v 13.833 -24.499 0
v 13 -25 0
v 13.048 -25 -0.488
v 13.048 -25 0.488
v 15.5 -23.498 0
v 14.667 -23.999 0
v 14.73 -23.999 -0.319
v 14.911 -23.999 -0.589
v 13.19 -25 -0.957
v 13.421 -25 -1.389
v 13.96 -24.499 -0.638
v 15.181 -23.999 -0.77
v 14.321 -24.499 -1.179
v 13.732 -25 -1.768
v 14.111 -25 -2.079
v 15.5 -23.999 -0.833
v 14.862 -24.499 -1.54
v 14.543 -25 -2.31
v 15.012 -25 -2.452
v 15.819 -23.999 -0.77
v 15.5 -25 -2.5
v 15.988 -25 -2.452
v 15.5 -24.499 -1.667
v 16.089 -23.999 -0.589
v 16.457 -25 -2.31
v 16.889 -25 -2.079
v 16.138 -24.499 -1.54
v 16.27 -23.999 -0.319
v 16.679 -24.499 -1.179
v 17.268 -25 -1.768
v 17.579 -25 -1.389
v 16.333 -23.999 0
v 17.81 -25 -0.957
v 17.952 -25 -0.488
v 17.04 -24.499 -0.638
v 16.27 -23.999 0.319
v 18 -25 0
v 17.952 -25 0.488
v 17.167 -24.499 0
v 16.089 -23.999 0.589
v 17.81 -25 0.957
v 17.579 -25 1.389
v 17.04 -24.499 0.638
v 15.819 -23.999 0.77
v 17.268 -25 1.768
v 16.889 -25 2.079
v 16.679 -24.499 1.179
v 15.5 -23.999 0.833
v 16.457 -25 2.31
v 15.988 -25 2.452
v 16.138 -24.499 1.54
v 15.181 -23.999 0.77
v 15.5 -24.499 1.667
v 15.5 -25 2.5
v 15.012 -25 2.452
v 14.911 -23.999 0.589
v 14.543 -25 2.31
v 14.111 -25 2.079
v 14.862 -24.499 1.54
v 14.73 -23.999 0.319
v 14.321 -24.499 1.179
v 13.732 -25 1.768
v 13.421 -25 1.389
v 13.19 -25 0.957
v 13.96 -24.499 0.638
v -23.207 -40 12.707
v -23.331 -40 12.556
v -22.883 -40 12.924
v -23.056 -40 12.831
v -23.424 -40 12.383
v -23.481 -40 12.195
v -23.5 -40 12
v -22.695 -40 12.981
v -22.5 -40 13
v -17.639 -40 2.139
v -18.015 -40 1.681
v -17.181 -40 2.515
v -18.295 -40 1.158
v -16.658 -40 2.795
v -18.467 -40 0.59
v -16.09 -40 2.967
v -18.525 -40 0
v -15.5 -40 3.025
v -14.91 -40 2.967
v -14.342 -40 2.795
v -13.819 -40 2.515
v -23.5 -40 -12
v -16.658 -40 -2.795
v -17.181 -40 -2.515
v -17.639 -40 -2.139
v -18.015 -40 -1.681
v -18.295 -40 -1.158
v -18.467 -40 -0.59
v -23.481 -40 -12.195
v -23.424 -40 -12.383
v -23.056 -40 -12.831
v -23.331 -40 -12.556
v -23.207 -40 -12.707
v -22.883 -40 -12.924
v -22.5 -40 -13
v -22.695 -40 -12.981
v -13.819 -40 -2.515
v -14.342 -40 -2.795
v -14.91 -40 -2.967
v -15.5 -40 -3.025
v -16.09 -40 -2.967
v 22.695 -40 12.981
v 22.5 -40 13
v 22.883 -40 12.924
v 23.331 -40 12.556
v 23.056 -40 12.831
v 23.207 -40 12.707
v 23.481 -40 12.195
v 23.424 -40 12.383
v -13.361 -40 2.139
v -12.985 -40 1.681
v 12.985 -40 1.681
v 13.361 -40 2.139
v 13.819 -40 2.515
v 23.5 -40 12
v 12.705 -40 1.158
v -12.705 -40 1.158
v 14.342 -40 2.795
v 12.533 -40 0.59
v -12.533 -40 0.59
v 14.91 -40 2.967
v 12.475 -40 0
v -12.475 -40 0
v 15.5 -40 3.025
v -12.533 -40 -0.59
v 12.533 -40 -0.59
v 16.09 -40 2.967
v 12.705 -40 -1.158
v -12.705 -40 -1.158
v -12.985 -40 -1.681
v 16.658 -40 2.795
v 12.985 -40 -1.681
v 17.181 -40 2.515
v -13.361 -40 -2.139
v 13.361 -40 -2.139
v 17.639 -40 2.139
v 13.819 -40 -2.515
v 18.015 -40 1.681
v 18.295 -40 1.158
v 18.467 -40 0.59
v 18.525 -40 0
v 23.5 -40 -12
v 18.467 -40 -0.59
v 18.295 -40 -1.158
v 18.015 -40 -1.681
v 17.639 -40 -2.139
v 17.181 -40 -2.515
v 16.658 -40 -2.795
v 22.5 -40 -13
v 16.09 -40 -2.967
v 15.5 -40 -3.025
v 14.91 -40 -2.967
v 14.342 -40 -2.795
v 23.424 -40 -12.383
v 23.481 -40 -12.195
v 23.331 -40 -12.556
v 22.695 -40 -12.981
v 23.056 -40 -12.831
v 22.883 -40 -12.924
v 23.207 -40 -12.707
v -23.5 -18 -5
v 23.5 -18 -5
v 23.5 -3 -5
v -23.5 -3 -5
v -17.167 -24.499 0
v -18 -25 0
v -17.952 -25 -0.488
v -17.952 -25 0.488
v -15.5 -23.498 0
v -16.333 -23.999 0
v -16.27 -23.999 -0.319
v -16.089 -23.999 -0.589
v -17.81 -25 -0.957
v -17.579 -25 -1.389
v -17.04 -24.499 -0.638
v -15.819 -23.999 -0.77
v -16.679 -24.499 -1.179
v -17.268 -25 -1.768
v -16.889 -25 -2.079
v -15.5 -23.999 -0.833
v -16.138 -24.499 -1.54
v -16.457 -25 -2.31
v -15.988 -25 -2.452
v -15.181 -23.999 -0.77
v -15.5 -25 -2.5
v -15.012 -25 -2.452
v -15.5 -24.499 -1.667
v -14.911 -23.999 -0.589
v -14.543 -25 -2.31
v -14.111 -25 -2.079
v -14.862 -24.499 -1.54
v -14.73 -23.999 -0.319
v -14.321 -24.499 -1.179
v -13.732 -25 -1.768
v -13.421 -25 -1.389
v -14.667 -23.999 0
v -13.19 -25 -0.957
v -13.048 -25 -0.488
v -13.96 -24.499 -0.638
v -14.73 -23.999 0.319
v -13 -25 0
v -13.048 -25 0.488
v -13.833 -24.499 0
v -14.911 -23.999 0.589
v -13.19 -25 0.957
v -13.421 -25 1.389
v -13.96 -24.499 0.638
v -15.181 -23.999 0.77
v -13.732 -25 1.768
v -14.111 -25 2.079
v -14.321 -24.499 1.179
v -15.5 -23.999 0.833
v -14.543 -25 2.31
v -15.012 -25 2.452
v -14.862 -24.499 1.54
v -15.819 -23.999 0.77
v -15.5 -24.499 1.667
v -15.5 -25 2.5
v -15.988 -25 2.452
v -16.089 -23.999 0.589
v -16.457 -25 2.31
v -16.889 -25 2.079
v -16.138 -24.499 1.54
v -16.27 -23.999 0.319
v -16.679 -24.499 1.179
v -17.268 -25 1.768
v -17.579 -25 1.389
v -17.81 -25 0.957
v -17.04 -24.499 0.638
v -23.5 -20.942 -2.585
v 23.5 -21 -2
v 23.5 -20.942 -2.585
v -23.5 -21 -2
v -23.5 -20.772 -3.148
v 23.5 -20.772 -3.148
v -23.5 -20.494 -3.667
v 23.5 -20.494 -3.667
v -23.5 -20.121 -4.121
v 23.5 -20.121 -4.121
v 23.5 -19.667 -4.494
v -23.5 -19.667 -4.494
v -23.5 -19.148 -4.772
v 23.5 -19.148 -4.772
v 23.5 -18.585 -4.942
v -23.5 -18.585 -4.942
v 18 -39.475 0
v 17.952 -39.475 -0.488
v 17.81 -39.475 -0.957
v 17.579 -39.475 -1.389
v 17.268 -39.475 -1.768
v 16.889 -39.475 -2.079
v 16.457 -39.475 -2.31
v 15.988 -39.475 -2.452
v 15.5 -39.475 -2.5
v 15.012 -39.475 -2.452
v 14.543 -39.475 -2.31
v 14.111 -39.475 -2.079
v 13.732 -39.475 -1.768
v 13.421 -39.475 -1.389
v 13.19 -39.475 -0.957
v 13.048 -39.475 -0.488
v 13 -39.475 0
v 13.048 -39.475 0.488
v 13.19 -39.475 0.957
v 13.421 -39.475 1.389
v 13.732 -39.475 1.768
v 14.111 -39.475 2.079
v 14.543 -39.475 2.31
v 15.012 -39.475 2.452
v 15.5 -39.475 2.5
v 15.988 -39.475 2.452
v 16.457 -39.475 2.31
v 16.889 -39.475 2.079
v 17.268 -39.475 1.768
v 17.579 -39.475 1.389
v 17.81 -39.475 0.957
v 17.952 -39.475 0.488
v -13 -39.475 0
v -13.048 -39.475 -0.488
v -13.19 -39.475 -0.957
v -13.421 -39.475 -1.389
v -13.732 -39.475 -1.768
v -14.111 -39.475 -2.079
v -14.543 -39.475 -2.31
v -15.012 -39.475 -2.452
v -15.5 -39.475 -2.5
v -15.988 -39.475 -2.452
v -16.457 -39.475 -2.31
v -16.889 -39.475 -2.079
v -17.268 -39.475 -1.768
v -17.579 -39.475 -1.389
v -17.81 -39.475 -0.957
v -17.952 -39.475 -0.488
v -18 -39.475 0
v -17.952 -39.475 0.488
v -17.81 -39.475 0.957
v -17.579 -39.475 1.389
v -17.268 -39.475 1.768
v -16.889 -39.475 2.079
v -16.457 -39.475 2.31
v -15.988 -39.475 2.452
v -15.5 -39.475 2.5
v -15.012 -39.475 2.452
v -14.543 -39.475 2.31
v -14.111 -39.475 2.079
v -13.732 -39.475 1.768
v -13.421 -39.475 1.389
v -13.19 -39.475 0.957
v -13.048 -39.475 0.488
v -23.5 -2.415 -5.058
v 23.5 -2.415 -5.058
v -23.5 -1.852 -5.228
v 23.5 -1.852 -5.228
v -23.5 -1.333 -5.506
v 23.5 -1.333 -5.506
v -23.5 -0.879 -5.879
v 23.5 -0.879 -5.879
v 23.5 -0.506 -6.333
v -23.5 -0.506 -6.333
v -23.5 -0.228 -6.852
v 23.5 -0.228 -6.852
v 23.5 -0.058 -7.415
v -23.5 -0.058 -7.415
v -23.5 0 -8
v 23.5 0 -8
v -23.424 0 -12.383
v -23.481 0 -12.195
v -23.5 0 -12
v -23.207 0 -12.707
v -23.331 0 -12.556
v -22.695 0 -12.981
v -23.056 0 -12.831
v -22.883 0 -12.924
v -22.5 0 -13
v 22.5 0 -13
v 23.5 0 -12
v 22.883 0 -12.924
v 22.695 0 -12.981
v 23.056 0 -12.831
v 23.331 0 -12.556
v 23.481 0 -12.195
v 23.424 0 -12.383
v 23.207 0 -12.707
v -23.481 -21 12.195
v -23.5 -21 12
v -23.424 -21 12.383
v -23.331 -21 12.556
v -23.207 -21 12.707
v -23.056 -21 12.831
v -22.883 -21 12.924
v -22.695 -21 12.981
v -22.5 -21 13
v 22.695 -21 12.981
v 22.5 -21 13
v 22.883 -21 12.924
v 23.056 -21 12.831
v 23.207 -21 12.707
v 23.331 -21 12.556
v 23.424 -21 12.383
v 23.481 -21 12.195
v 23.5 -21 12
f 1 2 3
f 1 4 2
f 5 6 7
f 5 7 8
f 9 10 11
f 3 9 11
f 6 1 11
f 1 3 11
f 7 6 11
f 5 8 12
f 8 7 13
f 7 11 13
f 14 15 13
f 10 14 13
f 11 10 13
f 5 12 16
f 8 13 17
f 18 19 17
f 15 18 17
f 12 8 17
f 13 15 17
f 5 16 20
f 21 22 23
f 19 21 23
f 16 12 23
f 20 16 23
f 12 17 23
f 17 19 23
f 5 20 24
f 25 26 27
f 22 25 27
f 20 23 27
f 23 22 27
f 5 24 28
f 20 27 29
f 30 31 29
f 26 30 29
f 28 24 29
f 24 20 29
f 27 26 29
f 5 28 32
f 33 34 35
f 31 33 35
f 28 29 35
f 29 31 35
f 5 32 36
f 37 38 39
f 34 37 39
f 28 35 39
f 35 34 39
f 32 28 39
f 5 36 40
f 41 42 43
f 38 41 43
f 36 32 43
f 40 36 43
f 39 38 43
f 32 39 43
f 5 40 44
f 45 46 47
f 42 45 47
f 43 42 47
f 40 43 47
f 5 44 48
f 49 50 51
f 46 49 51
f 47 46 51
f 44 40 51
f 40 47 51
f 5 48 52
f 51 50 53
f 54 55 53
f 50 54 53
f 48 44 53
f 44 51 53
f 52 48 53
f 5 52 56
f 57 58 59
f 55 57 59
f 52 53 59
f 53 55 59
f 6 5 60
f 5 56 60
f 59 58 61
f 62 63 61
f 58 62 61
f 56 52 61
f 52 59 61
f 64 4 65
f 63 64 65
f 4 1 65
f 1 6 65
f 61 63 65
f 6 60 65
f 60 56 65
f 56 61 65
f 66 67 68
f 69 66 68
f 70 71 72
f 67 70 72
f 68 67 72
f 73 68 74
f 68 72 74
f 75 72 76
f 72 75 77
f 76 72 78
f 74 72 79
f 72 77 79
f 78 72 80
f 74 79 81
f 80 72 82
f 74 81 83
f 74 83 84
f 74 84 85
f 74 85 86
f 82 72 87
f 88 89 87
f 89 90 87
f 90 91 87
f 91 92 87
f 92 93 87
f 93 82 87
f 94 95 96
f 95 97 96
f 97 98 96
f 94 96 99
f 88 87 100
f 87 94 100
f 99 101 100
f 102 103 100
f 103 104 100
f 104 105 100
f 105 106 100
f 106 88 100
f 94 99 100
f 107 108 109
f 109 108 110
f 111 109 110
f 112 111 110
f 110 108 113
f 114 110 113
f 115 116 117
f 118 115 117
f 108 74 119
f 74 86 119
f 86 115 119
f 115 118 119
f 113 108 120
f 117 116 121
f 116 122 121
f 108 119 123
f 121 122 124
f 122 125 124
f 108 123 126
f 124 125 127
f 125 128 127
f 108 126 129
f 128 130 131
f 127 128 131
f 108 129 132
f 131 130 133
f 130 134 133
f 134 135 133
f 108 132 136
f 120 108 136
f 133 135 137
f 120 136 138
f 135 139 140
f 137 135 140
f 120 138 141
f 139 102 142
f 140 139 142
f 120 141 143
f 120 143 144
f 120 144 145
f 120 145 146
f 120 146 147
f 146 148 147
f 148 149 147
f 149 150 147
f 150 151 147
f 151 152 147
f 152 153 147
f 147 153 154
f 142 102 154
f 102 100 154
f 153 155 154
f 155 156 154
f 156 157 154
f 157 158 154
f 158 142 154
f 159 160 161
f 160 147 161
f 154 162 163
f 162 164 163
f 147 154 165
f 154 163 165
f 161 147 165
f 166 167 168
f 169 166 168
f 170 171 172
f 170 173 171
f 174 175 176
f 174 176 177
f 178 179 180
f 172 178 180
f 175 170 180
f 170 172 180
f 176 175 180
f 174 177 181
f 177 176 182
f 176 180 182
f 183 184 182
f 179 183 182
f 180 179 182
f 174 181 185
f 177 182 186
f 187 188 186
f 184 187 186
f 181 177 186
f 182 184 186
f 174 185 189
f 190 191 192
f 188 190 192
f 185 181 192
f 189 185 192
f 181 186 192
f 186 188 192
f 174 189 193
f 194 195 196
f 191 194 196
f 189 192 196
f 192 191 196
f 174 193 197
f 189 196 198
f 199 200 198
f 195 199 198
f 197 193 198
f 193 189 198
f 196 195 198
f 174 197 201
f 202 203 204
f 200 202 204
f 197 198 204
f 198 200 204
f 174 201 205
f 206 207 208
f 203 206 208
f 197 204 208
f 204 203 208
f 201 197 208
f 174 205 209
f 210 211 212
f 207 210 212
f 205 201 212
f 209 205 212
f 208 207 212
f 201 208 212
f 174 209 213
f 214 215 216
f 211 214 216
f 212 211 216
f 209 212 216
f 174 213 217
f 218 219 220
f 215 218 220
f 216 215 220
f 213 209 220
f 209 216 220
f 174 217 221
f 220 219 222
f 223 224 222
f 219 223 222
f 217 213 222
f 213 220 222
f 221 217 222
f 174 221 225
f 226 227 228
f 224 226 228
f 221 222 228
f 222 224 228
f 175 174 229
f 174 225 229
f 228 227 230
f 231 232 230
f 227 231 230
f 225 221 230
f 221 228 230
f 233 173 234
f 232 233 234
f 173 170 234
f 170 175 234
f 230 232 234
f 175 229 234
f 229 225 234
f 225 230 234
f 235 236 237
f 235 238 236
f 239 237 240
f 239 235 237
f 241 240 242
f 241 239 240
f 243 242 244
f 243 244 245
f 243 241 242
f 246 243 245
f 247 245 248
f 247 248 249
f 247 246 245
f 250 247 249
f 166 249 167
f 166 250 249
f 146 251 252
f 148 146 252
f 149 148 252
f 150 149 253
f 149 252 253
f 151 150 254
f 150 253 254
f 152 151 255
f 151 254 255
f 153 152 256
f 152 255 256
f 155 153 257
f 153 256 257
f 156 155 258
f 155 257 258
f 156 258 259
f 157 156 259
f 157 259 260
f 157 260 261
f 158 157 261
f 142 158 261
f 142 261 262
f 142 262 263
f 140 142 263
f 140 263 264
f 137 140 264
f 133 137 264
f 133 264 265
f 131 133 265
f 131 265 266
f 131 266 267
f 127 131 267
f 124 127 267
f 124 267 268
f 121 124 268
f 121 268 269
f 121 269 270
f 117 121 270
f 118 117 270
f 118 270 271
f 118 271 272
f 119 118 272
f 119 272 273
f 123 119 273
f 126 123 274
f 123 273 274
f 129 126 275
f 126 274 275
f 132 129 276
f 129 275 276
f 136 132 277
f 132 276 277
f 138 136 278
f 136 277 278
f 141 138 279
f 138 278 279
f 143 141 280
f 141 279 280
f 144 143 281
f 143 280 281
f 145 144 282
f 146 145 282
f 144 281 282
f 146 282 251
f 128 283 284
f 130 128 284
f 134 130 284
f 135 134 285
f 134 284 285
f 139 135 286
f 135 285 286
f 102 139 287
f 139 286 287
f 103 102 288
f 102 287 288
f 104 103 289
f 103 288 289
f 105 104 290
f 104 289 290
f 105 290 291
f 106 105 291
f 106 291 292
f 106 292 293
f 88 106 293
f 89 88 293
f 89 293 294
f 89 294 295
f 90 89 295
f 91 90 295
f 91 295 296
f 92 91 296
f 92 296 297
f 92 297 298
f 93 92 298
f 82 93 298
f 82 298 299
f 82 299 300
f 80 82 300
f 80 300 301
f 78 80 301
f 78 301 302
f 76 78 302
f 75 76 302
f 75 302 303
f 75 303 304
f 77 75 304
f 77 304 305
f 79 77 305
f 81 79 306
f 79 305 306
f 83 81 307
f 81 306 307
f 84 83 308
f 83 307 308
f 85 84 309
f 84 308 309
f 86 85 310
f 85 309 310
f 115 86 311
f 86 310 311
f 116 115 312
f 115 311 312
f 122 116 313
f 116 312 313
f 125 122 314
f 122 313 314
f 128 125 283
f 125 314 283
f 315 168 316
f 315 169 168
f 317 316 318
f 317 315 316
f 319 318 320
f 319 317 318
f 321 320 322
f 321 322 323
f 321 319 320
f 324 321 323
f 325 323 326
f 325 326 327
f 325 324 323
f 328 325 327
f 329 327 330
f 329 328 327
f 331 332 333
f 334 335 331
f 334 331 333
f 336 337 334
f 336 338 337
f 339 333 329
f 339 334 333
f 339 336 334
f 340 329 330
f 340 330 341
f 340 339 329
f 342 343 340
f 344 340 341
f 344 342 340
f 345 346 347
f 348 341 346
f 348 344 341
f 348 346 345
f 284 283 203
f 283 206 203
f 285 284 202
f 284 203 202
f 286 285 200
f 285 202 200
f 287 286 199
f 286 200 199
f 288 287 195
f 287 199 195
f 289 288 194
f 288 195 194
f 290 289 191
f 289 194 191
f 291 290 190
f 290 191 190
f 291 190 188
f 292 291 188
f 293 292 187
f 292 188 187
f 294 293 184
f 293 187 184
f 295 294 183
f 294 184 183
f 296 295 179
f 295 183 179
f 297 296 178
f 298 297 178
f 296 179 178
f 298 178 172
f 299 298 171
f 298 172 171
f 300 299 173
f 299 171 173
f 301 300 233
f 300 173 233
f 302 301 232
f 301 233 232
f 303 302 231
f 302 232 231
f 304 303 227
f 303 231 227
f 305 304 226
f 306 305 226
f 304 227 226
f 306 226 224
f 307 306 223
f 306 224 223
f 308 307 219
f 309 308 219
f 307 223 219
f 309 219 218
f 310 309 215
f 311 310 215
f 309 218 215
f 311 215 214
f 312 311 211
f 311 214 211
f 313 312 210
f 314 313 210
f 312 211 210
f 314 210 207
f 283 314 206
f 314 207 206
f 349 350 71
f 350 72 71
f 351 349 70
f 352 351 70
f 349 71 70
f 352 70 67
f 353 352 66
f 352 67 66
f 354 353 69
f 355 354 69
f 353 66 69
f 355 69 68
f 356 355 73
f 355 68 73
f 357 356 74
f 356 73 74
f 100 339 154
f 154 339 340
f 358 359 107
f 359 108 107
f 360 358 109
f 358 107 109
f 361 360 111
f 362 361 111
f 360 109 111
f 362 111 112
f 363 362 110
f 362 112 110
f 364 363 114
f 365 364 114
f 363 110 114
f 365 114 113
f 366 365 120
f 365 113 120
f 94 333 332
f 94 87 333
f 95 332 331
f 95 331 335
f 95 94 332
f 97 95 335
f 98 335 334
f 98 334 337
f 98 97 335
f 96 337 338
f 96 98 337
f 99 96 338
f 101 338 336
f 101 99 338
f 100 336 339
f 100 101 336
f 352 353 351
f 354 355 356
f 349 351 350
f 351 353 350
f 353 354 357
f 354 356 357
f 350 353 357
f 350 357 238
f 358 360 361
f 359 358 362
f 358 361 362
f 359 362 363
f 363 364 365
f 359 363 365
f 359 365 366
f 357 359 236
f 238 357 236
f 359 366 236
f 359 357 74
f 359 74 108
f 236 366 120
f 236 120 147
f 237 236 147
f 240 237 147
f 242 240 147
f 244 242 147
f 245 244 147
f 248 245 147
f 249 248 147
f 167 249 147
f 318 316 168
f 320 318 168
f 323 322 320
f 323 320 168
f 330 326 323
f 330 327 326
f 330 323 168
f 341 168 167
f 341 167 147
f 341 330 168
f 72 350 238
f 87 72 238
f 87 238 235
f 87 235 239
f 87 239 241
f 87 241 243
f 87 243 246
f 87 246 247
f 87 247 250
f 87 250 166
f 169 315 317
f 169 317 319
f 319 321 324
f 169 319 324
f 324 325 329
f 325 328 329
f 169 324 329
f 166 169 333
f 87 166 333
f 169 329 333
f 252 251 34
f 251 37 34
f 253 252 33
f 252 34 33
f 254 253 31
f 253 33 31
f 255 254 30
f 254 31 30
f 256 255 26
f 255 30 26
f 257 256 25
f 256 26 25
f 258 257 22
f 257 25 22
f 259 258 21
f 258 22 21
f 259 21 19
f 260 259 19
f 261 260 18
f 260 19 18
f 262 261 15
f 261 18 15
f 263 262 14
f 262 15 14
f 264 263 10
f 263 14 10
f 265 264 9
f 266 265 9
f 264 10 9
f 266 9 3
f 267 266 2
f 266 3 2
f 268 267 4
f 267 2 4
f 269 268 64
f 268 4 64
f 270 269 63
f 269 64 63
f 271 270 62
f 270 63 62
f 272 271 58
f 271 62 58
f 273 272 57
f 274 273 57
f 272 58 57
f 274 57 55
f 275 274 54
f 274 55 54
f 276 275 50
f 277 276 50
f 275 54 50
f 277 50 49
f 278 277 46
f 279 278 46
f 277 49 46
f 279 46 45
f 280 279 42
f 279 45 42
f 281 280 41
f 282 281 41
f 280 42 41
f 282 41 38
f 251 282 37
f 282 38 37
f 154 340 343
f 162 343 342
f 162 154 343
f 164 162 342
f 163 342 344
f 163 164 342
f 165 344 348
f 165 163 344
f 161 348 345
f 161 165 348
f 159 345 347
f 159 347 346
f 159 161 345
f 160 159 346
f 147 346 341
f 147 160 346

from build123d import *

# Parameters (mm, degrees)
SKETCH1_W                   = 47
SKETCH1_H                   = 26
BOSS_EXTRUDE1_DEPTH         = 40
CUT_EXTRUDE1_REACH          = 65.071
SKETCH2_W                   = 18
SKETCH2_H                   = 21
FILLET1_R                   = 3
M6_TAPPED_HOLE1_D           = 5
M6_TAPPED_HOLE1_DEPTH       = 15
M6_TAPPED_HOLE1_CSINK_D     = 6.05
M6_TAPPED_HOLE1_CSINK_ANGLE = 90
M6_TAPPED_HOLE1_TIP         = 1.502151548
FILLET2_R                   = 1


with BuildPart() as part:
    # Sketch1 → Boss-Extrude1 (new body)
    with BuildSketch(Plane(origin=(0, 0, 0), x_dir=(1, 0, 0), z_dir=(0, 1, 0))):
        Rectangle(SKETCH1_W, SKETCH1_H)
    extrude(amount=-BOSS_EXTRUDE1_DEPTH)

    # Sketch2 → Cut-Extrude1 (cut, up to next)
    with BuildSketch(Plane(origin=(23.5, 0, 0), x_dir=(0, 0, -1), z_dir=(1, 0, 0)), mode=Mode.PRIVATE) as cut_extrude1_sk1:
        with Locations((-4, -10.5)):
            Rectangle(SKETCH2_W, SKETCH2_H)
    cut_extrude1_tool1 = extrude(cut_extrude1_sk1.sketch, amount=-CUT_EXTRUDE1_REACH, mode=Mode.PRIVATE) & part.part
    add(cut_extrude1_tool1.solids().sort_by_distance((23.5, -10.5, 4))[0], mode=Mode.SUBTRACT)

    # Fillet1
    fillet1_edges = [part.edges().sort_by_distance(p)[0] for p in [
        (0, 0, -5),
        (0, -21, -5),
    ]]
    fillet(fillet1_edges, radius=FILLET1_R)

    # M6 Tapped Hole1
    with Locations(Plane(origin=(0, -40, 0), x_dir=(-1, 0, 0), z_dir=(0, -1, 0))):
        with Locations((-15.5, 0), (15.5, 0)):
            CounterSinkHole(M6_TAPPED_HOLE1_D / 2, M6_TAPPED_HOLE1_CSINK_D / 2, depth=M6_TAPPED_HOLE1_DEPTH, counter_sink_angle=M6_TAPPED_HOLE1_CSINK_ANGLE)
            with Locations((0, 0, -(M6_TAPPED_HOLE1_DEPTH + M6_TAPPED_HOLE1_TIP / 2))):  # 118° drill point
                Cone(0, M6_TAPPED_HOLE1_D / 2, M6_TAPPED_HOLE1_TIP, mode=Mode.SUBTRACT)

    # Fillet2
    fillet2_edges = [part.edges().sort_by_distance(p)[0] for p in [
        (23.5, -30.5, 13),
        (-23.5, -30.5, 13),
        (-23.5, -20, -13),
        (23.5, -20, -13),
    ]]
    fillet(fillet2_edges, radius=FILLET2_R)


solid = part.part
